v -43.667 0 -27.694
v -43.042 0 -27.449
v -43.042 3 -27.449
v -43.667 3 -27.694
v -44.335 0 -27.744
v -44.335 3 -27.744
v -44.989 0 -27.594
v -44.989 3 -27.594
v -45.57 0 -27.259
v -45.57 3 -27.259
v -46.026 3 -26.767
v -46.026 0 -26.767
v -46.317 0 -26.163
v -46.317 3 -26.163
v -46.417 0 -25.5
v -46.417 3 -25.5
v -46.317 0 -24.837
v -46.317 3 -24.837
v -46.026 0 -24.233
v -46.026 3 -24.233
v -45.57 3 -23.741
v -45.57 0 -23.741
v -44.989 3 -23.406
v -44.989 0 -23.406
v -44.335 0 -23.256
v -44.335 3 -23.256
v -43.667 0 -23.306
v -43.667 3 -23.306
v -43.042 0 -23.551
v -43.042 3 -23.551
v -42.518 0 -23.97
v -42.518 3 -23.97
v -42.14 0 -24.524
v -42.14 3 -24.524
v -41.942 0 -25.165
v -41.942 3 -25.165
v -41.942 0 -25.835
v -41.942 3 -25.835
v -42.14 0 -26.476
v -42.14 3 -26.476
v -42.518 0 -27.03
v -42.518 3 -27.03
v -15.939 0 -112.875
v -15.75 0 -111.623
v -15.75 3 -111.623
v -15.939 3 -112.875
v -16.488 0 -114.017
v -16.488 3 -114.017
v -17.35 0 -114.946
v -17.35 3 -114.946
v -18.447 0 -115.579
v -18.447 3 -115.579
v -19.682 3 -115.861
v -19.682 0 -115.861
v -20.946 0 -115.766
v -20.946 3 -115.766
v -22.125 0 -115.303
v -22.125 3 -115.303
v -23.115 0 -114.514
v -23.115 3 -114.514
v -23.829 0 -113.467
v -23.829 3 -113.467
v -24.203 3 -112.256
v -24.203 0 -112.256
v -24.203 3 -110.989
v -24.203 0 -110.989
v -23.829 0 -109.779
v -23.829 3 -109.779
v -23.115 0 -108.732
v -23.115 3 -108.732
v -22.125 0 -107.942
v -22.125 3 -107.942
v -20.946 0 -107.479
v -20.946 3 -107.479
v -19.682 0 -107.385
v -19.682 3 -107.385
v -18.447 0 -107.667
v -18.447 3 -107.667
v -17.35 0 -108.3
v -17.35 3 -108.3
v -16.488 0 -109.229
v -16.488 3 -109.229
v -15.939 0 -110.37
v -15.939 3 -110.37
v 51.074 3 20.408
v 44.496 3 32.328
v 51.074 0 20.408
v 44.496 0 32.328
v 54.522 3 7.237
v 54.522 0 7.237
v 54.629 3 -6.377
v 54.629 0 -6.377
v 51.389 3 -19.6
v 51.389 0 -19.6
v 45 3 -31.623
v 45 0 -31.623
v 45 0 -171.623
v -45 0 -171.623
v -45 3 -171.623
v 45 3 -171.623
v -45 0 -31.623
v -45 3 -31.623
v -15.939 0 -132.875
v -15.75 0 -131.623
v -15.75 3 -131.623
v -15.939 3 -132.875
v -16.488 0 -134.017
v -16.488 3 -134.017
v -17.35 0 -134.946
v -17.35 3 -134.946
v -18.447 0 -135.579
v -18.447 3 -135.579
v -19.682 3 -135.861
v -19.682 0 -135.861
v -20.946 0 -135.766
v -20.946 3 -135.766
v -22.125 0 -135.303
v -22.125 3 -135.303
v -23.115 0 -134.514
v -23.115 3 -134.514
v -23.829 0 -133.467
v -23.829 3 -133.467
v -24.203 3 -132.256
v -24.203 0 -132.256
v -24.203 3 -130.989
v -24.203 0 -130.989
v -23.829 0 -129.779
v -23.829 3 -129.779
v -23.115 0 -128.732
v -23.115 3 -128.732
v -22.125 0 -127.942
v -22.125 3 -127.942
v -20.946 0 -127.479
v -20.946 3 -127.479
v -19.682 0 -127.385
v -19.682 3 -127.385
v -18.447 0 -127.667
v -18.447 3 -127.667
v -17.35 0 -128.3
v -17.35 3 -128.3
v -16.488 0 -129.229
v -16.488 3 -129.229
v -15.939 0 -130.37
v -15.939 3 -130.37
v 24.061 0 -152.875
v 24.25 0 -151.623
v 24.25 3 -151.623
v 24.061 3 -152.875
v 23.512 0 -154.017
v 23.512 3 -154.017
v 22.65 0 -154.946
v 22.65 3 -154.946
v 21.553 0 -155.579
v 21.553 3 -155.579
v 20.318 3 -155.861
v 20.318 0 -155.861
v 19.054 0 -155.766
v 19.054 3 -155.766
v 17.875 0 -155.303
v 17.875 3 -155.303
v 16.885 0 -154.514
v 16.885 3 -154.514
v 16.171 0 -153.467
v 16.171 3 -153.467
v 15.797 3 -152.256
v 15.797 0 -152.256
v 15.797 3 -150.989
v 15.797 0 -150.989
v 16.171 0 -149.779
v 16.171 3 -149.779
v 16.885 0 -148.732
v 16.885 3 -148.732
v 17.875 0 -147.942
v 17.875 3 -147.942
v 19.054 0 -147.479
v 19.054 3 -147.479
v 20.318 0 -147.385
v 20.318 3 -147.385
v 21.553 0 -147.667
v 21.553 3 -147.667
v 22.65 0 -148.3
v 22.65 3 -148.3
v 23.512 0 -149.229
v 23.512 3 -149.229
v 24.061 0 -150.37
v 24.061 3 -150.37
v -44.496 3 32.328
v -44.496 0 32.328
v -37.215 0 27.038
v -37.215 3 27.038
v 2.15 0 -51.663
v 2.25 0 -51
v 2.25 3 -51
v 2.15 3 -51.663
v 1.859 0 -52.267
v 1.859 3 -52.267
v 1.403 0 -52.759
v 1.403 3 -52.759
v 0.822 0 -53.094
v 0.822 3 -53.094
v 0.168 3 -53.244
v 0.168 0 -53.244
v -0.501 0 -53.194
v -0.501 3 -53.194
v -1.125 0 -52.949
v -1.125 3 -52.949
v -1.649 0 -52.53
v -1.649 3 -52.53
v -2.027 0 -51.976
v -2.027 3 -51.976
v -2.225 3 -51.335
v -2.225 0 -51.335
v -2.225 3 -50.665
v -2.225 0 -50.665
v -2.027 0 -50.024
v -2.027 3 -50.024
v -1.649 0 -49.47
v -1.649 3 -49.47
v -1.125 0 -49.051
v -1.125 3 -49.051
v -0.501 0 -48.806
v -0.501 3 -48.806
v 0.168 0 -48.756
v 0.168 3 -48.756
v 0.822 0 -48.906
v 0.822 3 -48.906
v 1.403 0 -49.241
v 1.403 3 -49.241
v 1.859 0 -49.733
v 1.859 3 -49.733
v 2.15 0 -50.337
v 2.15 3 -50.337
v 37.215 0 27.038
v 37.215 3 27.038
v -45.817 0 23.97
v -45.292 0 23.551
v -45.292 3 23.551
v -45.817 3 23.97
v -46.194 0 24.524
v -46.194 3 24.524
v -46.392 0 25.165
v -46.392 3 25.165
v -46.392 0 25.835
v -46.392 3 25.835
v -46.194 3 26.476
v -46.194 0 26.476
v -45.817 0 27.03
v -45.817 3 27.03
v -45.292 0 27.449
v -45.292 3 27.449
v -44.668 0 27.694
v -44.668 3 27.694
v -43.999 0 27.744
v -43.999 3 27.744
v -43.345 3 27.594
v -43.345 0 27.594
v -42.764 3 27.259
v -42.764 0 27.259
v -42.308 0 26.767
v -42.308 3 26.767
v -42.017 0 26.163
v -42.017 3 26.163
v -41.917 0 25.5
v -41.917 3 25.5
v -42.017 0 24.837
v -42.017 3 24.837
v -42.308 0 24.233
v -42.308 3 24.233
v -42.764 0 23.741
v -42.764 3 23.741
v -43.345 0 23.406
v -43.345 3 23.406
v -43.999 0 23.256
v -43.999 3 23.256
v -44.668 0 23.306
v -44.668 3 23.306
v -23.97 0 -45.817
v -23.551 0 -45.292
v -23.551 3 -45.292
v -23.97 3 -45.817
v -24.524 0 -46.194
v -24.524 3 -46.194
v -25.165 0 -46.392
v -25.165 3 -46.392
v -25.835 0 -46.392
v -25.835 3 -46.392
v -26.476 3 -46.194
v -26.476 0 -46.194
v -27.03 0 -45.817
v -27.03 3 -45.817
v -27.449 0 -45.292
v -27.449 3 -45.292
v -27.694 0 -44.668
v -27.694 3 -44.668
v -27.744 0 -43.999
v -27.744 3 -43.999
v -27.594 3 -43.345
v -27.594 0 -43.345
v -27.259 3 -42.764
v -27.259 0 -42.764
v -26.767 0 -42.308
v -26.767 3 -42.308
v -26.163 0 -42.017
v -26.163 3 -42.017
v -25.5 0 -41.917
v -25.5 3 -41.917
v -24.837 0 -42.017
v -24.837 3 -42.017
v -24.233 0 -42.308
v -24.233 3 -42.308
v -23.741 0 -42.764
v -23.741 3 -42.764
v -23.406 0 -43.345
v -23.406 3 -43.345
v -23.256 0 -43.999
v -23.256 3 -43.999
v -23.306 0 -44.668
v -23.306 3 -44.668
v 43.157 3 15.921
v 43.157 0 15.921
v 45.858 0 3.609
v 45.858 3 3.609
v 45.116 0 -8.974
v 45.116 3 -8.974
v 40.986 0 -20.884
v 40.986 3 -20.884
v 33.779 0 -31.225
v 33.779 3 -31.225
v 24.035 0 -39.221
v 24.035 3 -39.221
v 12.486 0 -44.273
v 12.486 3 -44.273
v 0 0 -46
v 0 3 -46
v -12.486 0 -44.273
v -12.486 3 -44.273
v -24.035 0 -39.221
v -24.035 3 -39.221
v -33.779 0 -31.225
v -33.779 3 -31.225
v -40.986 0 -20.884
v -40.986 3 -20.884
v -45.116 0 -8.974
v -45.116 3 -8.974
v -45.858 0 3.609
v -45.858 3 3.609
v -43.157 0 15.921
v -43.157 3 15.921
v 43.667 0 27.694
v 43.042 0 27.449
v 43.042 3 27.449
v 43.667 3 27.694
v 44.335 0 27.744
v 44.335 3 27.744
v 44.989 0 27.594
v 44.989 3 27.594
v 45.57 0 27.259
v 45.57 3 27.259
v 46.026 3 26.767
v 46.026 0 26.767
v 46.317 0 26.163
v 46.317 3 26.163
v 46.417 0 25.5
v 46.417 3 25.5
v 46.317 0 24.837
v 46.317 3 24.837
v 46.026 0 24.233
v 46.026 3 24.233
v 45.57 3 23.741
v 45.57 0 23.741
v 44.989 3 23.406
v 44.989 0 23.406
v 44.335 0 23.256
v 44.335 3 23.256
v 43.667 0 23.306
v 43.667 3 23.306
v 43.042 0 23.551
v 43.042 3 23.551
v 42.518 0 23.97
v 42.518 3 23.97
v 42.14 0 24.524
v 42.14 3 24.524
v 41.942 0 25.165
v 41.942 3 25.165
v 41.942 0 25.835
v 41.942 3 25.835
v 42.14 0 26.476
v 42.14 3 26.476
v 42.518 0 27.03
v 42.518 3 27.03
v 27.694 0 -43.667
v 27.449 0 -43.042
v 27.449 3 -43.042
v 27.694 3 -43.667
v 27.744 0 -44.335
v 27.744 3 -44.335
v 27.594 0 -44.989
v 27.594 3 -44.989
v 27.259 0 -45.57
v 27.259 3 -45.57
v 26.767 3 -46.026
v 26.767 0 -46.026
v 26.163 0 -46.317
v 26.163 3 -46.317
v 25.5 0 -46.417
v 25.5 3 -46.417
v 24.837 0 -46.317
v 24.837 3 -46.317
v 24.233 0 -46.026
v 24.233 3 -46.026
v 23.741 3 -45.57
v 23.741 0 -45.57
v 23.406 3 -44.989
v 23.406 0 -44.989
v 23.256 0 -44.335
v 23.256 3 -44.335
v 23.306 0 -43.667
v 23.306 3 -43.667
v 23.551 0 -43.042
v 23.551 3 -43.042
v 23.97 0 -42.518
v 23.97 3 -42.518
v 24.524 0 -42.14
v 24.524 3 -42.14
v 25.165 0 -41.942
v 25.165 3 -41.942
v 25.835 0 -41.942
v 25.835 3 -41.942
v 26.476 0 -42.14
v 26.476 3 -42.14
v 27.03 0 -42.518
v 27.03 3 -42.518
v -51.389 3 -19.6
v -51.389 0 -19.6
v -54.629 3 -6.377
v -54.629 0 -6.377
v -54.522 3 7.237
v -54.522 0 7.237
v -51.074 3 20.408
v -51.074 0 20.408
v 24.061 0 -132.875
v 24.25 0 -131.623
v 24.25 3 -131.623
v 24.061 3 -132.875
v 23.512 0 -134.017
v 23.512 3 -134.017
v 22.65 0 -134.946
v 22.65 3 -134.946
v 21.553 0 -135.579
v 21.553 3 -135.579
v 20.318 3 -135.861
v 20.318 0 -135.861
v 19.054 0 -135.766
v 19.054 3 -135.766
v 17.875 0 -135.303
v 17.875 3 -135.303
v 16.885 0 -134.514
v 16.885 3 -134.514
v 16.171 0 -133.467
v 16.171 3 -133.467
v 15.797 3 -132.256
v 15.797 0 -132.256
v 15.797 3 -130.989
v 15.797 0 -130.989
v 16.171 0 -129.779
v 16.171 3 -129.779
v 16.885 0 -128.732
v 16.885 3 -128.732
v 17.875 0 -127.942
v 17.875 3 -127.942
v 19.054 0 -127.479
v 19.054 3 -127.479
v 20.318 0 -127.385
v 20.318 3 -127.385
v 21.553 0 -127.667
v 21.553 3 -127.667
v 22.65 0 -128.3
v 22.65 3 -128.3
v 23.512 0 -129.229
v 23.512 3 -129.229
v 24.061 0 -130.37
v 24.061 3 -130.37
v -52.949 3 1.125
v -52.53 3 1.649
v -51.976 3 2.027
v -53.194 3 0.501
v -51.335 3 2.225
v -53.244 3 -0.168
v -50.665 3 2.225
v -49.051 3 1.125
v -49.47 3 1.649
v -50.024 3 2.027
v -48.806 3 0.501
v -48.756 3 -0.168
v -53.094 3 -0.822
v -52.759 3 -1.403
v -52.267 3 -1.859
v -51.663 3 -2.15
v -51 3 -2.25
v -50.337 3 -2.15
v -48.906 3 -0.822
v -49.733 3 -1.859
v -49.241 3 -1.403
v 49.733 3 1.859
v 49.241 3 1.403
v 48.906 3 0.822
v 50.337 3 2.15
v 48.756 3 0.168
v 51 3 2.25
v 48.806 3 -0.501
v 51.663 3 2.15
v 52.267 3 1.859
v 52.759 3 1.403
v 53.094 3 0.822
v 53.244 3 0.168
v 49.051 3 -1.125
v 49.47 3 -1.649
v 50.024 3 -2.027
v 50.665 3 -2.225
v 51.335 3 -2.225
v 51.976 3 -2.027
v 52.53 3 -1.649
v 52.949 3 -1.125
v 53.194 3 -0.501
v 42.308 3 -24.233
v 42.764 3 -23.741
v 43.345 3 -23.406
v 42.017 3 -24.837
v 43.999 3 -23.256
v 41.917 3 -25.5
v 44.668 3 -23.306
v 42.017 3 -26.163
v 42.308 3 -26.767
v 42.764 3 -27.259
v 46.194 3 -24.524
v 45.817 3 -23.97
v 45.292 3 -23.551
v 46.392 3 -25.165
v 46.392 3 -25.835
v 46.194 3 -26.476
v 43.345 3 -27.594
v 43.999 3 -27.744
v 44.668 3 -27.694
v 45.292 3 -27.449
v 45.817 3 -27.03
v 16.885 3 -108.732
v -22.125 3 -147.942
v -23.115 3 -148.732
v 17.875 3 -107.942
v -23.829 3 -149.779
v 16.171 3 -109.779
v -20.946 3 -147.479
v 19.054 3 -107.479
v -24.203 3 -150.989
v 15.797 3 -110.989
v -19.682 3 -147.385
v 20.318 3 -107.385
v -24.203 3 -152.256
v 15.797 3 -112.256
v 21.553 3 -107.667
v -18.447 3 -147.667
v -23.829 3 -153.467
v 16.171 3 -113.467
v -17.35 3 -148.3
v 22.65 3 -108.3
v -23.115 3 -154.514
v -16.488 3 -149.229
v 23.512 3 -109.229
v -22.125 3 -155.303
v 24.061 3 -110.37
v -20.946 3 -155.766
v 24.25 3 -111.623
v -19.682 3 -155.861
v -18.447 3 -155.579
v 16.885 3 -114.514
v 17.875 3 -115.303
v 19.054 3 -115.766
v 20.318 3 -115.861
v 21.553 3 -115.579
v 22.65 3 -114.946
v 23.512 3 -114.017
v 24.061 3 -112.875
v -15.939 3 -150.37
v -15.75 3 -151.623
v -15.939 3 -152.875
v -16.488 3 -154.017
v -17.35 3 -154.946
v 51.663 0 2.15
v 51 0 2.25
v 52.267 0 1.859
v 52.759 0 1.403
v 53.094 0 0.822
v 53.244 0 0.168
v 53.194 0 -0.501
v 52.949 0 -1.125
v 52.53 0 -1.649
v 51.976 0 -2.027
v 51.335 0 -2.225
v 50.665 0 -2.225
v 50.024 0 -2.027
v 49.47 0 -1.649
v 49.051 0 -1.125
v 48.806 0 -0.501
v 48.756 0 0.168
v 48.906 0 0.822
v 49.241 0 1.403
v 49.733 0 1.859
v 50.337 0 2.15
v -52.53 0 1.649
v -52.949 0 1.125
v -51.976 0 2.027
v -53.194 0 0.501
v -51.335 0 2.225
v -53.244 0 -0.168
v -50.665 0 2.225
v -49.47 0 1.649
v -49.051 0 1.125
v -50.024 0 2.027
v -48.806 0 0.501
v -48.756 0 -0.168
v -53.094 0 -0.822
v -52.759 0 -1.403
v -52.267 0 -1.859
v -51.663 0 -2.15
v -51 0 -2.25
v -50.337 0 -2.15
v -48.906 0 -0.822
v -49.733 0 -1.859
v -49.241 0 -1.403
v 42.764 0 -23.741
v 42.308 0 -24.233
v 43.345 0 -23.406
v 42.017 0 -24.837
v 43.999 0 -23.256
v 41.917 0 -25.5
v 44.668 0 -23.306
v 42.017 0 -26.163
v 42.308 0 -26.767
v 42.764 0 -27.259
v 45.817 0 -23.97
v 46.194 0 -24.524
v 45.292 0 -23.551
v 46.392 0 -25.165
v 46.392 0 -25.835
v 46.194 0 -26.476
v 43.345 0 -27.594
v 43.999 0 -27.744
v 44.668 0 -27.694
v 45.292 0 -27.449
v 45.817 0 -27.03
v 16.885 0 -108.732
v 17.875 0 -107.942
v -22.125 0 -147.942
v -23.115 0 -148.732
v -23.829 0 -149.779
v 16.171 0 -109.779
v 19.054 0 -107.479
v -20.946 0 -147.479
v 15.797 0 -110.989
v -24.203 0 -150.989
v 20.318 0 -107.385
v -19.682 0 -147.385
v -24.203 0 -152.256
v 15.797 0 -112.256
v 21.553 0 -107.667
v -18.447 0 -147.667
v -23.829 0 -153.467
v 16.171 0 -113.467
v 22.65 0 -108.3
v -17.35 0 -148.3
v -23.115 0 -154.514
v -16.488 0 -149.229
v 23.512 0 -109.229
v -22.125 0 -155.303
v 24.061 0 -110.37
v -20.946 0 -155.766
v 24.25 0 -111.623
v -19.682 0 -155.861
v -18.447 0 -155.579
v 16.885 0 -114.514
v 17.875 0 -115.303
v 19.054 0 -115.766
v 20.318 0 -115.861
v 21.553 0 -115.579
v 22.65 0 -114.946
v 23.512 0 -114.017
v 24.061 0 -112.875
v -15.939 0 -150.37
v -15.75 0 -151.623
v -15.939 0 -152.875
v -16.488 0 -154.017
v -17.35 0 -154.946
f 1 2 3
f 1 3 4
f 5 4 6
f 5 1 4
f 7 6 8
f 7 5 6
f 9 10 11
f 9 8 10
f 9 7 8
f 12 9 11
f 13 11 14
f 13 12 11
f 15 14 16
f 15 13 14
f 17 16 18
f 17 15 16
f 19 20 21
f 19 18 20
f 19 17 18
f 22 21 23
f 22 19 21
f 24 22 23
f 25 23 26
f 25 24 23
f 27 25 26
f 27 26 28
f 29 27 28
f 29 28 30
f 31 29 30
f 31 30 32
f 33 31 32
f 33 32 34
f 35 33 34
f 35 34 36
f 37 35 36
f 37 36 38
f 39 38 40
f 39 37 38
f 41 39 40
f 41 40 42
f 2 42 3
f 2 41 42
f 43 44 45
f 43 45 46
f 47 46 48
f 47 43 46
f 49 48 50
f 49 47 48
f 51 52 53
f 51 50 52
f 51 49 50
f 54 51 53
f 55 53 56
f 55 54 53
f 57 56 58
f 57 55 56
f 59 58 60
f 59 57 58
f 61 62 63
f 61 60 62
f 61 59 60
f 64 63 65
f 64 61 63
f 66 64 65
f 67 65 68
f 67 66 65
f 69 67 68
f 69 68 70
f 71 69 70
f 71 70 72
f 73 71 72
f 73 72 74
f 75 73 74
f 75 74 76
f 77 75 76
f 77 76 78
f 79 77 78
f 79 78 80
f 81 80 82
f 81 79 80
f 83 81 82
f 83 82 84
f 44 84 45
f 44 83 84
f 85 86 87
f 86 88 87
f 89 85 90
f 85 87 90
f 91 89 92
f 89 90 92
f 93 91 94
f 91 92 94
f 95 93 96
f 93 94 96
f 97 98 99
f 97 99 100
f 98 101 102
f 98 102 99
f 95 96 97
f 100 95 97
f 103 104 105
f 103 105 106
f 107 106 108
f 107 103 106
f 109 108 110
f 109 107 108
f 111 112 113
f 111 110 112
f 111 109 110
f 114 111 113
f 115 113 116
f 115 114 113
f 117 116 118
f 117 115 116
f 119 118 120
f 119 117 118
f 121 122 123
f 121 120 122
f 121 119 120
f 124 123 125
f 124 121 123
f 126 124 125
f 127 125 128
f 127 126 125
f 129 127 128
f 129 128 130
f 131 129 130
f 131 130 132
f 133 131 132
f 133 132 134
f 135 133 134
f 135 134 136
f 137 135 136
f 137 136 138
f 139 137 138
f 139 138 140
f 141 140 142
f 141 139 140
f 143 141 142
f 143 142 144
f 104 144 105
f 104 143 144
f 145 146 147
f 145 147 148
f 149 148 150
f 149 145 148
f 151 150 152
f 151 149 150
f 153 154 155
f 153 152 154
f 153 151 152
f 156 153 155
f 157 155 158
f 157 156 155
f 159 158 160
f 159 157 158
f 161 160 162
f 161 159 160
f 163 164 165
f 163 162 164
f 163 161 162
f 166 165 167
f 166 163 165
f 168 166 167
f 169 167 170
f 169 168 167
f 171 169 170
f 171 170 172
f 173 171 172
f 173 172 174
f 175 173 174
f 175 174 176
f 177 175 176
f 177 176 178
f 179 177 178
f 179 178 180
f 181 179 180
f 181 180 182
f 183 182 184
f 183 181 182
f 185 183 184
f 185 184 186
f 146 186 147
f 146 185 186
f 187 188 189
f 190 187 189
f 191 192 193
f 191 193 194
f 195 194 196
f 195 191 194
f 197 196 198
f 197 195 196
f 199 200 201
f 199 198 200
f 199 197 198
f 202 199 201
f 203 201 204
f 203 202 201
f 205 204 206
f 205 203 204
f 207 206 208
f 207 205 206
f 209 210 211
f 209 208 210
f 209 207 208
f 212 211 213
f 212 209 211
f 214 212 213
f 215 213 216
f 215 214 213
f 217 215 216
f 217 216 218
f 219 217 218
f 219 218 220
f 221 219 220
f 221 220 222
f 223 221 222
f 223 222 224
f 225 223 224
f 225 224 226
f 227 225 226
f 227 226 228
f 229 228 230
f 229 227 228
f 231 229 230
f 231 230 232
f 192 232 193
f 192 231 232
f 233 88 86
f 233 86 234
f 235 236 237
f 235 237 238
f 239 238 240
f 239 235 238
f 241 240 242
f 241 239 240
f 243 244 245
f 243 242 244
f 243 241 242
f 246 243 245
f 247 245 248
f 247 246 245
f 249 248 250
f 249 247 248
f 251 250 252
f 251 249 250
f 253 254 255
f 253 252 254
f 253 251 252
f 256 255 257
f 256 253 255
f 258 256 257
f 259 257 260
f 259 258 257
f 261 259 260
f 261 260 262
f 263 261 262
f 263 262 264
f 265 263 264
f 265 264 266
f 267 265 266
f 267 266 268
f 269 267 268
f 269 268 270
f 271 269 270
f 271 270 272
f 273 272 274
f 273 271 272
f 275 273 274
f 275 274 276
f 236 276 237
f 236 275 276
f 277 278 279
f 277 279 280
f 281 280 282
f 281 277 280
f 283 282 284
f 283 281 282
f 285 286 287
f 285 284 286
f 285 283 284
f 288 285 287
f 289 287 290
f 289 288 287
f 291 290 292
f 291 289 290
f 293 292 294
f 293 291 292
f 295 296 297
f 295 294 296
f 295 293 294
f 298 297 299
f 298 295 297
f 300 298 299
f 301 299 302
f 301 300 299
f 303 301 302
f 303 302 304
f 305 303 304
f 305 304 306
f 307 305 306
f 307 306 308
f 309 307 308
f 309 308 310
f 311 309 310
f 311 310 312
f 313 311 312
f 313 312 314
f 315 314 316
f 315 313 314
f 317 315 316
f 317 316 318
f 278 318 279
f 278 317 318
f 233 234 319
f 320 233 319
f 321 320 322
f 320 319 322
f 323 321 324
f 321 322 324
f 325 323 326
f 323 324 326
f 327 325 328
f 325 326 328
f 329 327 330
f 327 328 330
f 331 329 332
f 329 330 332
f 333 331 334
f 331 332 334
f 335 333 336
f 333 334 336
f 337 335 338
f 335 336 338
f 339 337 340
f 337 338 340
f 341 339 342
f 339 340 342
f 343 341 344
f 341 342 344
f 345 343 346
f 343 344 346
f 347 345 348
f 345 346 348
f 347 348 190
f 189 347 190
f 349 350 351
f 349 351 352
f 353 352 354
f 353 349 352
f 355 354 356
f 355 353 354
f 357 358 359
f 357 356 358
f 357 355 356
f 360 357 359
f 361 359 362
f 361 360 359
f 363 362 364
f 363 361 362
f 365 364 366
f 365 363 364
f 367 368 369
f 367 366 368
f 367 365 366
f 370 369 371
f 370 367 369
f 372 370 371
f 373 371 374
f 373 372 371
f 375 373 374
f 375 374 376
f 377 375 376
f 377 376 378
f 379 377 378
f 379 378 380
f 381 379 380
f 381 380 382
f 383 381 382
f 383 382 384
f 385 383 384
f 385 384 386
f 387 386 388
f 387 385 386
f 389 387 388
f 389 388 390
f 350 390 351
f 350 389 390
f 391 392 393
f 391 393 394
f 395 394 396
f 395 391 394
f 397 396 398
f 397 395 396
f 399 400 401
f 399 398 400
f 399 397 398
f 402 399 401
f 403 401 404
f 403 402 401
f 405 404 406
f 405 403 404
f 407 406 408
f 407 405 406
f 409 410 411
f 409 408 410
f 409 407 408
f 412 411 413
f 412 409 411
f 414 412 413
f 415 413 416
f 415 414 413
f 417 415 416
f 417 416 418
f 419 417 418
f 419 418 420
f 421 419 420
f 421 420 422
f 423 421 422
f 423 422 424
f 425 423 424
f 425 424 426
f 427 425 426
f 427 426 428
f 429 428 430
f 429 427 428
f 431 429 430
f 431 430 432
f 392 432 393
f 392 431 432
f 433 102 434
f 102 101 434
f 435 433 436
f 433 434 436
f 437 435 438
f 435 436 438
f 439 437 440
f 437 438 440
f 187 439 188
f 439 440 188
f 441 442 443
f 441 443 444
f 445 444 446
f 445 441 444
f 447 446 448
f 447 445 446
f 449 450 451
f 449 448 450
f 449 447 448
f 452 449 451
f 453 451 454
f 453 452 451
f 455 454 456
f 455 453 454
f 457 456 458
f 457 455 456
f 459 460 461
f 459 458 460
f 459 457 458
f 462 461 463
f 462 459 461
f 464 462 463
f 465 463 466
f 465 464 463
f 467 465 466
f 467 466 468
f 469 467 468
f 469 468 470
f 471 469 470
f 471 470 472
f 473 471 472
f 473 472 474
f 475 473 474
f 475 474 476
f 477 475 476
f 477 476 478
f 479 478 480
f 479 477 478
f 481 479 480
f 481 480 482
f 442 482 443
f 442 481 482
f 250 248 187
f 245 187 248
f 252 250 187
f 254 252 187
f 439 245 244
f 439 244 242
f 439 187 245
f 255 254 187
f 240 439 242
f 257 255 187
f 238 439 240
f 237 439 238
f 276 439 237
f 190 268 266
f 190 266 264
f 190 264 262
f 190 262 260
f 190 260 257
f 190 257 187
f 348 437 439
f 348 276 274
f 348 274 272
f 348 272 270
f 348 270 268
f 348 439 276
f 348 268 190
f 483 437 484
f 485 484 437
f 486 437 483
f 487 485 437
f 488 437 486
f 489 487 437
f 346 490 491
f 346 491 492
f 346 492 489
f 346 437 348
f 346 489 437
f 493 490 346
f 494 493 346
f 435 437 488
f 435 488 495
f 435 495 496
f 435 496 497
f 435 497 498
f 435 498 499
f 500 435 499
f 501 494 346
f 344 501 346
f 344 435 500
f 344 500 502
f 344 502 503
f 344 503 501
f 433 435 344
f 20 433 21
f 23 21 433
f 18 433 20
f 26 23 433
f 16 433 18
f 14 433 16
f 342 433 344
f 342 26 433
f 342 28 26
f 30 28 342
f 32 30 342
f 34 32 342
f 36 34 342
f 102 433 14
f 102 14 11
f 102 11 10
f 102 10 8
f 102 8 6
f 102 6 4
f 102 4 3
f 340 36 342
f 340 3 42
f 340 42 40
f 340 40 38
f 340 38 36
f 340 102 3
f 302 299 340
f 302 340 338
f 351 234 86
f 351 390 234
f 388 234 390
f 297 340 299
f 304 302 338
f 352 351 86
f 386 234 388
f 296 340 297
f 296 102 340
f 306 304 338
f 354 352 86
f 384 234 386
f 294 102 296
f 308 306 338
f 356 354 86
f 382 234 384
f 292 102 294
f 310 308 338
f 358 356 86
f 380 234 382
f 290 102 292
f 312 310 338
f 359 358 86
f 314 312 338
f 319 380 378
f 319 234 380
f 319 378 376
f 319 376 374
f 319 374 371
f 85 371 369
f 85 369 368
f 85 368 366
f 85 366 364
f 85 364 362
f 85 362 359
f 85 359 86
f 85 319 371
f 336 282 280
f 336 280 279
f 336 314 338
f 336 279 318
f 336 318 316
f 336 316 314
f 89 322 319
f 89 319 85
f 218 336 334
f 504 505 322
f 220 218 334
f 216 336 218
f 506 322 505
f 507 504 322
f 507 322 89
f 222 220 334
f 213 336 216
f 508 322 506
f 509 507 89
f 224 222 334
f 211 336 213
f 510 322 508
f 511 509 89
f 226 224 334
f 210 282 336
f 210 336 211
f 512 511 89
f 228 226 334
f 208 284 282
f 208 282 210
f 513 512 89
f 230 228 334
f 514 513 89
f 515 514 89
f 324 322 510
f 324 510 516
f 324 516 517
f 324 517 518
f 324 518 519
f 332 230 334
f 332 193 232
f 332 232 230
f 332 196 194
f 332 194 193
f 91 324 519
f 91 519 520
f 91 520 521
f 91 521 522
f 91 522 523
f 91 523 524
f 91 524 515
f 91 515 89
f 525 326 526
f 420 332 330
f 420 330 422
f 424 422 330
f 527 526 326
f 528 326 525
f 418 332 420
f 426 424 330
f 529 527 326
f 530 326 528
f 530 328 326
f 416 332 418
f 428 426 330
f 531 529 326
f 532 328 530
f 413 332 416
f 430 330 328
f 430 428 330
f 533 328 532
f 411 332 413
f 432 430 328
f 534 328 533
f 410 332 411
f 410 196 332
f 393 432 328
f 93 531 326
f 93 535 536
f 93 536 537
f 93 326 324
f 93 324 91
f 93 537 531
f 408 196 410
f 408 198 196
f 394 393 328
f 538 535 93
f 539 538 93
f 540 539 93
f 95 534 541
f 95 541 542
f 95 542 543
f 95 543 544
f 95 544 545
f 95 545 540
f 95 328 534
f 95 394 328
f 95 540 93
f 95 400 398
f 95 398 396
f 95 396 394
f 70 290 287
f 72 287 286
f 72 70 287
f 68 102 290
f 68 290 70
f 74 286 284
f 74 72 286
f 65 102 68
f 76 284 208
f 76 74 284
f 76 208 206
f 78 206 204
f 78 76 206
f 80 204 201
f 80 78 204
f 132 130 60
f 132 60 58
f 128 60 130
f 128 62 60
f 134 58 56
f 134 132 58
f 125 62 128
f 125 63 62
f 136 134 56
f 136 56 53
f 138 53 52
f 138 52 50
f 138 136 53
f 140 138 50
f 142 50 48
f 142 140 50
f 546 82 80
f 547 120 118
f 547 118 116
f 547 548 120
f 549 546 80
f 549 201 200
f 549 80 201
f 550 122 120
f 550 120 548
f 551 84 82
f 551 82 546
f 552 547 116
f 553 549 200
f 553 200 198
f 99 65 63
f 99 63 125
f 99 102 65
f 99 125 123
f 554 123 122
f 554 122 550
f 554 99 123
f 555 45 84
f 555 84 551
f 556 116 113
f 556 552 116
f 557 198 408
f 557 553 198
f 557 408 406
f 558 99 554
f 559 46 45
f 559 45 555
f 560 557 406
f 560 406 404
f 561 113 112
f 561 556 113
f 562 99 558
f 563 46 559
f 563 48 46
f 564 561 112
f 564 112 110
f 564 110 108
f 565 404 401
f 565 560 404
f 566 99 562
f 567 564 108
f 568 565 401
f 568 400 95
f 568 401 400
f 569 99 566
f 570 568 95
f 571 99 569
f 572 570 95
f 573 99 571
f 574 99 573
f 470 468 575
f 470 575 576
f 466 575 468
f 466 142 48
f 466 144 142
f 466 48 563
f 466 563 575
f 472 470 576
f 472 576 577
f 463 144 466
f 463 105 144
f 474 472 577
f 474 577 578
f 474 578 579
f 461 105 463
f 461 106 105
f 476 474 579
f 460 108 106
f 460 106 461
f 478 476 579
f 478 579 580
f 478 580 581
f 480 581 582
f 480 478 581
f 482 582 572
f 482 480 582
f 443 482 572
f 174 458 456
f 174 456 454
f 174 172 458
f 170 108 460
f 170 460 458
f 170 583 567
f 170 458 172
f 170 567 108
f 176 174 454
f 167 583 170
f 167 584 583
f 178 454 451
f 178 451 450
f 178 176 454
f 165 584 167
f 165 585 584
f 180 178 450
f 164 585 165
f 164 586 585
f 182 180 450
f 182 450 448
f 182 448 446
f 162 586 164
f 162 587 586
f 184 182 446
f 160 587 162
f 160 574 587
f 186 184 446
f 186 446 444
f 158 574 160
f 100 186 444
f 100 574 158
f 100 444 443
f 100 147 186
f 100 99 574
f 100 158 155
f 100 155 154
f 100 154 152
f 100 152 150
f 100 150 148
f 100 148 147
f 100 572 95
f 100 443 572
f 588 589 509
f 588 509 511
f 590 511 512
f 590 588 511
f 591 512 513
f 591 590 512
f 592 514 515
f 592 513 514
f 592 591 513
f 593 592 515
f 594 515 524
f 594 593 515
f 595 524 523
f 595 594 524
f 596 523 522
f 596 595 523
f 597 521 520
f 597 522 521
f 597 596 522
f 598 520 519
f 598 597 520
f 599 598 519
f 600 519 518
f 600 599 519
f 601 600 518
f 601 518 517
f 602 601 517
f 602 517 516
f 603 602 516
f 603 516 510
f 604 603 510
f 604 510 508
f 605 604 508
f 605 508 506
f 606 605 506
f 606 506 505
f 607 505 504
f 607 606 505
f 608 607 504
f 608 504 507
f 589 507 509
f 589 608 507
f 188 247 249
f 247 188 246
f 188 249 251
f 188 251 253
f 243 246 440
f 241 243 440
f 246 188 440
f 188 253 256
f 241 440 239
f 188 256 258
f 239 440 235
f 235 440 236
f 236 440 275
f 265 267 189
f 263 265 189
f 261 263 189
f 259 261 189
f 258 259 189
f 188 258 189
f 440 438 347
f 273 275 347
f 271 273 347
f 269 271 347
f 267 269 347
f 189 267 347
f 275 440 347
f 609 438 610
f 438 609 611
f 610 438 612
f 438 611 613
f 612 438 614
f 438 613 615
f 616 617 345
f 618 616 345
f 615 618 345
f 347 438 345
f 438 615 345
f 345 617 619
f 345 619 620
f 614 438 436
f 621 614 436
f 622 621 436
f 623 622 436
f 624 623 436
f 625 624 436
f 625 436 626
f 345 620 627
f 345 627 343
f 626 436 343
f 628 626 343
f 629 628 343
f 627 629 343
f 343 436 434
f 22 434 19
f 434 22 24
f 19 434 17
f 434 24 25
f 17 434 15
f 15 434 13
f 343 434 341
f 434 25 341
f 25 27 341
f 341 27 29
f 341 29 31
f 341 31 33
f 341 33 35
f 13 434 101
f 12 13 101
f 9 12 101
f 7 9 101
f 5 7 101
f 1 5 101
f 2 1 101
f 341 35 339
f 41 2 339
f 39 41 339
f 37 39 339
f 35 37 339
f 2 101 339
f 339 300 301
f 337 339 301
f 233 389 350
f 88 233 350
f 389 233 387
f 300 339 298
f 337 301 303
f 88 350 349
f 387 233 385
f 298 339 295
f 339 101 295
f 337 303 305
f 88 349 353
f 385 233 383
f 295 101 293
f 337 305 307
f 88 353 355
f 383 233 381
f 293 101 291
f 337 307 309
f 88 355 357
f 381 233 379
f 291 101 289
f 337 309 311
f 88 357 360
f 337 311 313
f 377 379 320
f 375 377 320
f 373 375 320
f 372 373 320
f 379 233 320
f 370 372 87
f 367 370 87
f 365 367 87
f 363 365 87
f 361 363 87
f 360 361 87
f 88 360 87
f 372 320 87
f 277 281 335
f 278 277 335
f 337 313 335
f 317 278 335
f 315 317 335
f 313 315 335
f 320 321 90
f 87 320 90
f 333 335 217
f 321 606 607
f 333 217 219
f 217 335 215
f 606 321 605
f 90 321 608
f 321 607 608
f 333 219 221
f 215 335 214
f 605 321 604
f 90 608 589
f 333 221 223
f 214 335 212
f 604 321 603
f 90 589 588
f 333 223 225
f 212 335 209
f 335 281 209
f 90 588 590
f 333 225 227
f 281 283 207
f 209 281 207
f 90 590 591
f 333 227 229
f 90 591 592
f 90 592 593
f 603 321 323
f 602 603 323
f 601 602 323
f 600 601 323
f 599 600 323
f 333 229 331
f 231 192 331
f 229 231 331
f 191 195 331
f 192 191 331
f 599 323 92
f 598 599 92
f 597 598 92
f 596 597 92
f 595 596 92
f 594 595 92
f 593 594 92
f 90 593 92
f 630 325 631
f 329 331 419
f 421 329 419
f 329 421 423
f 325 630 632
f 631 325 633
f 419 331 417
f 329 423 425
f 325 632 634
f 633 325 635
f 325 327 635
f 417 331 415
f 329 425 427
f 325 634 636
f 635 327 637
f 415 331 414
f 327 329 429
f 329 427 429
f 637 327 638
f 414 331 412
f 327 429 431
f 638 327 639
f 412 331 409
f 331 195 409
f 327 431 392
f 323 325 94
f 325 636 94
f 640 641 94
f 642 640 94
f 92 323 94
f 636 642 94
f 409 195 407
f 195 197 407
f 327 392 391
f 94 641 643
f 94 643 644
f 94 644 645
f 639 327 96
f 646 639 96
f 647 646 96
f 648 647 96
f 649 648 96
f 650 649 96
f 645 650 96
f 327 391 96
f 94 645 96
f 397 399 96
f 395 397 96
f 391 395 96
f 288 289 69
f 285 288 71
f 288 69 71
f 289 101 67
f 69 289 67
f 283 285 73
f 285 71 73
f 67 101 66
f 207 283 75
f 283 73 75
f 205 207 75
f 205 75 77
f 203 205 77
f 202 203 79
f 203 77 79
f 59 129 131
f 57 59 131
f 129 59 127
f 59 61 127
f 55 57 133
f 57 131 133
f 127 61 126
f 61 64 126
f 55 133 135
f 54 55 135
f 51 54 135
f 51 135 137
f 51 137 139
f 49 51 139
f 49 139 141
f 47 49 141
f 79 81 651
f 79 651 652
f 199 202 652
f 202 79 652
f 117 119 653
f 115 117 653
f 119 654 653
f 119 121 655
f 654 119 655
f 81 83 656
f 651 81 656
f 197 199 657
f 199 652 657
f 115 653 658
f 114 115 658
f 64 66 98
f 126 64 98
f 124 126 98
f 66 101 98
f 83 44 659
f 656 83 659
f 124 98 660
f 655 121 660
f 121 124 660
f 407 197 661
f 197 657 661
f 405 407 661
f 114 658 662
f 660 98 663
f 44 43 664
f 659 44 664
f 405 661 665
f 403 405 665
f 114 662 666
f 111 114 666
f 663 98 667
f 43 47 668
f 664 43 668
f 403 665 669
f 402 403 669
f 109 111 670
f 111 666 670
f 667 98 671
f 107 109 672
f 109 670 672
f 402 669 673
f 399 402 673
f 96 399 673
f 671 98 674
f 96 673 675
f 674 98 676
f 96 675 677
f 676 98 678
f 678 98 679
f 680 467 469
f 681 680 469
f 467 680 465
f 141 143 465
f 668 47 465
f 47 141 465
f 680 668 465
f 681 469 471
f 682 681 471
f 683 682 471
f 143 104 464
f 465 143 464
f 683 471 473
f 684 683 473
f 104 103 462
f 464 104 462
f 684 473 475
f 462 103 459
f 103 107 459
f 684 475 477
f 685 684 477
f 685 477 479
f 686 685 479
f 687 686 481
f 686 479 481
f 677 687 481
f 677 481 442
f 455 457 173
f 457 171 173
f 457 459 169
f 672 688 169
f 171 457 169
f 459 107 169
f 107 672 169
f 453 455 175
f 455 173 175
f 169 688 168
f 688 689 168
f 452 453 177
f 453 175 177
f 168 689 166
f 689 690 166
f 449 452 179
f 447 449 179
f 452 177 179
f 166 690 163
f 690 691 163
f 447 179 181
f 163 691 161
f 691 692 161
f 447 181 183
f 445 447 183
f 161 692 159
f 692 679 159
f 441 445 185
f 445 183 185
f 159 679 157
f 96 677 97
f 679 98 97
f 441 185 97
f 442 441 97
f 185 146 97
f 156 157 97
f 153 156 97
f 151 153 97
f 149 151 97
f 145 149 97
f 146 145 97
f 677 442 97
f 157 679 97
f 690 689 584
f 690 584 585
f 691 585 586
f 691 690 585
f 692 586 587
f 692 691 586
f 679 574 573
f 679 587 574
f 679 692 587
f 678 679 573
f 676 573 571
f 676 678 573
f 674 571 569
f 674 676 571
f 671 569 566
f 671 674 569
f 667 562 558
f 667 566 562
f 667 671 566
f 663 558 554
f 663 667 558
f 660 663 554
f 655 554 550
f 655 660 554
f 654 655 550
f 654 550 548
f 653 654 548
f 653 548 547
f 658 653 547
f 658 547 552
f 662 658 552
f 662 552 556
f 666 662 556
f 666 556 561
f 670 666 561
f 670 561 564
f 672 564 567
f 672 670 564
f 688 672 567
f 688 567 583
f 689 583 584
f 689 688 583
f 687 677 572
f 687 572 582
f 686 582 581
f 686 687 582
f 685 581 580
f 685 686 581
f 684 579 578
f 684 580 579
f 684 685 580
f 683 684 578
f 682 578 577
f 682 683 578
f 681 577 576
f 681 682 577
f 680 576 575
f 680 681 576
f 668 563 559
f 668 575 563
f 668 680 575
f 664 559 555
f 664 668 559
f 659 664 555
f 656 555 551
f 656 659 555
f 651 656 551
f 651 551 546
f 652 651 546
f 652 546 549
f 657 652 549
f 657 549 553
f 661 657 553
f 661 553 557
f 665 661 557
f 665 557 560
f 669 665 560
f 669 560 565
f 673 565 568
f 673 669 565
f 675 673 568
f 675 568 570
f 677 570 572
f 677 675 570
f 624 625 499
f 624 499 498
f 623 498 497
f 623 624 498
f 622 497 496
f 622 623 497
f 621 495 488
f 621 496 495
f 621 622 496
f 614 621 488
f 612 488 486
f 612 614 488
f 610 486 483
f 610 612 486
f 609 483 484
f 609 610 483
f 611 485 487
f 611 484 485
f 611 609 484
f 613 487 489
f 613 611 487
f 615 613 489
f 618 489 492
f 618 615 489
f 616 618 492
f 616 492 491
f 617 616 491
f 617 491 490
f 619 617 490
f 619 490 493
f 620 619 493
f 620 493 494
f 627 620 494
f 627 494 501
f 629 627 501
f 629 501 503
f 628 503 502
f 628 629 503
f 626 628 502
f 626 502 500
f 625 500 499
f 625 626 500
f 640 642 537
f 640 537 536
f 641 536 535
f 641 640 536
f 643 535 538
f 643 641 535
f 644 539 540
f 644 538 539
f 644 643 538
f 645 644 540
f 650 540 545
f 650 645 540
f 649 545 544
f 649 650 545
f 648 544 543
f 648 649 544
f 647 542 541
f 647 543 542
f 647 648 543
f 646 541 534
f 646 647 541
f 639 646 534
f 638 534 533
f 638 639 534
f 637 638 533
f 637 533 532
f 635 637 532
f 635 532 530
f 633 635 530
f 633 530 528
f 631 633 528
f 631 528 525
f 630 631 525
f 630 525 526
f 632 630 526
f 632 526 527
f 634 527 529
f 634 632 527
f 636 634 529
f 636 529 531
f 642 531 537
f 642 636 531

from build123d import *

# Parameters (mm, degrees)
SKETCH1_R               = 55
BOSS_EXTRUDE1_DEPTH     = 3
SKETCH2_W               = 90
SKETCH2_H               = 140
BOSS_EXTRUDE2_DEPTH     = 3
SKETCH4_R               = 46
CUT_EXTRUDE2_DEPTH      = 1
CUT_EXTRUDE2_DEPTH_BACK = 4
CUT_EXTRUDE5_START      = -4
CUT_EXTRUDE5_DEPTH      = 5
CUT_EXTRUDE3_START      = -4
SKETCH5_R               = 2.25
CUT_EXTRUDE3_DEPTH      = 5
CIRPATTERN1_COUNT       = 12
CUT_EXTRUDE4_START      = -4
SKETCH6_R               = 4.25
CUT_EXTRUDE4_DEPTH      = 5
LPATTERN1_COUNT         = 3
LPATTERN1_PITCH         = 20


with BuildPart() as part:
    # Sketch1 → Boss-Extrude1 (new body)
    with BuildSketch(Plane(origin=(0, 0, 0), x_dir=(1, 0, 0), z_dir=(0, 1, 0))):
        Circle(SKETCH1_R)
    extrude(amount=BOSS_EXTRUDE1_DEPTH)

    # Sketch2 → Boss-Extrude2 (add)
    with BuildSketch(Plane(origin=(0, 0, 0), x_dir=(1, 0, 0), z_dir=(0, 1, 0))):
        with Locations((0, 101.622776602)):
            Rectangle(SKETCH2_W, SKETCH2_H)
    extrude(amount=BOSS_EXTRUDE2_DEPTH)

    # Sketch4 → Cut-Extrude2 (cut, two sides)
    with BuildSketch(Plane(origin=(0, 3, 0), x_dir=(1, 0, 0), z_dir=(0, 1, 0))) as cut_extrude2_sk:
        Circle(SKETCH4_R)
    extrude(amount=CUT_EXTRUDE2_DEPTH, mode=Mode.SUBTRACT)
    extrude(cut_extrude2_sk.sketch, amount=-CUT_EXTRUDE2_DEPTH_BACK, mode=Mode.SUBTRACT)

    # Sketch7 → Cut-Extrude5 (cut)
    with BuildSketch(Plane(origin=(0, 3, 0), x_dir=(1, 0, 0), z_dir=(0, 1, 0)).offset(CUT_EXTRUDE5_START)):
        with BuildLine():
            Line((0, 0), (0, -55))
            ThreePointArc((0, -55), (-24.969477486, -49.00535883), (-44.495934691, -32.328188876))
            Line((-44.495934691, -32.328188876), (0, 0))
        make_face()
    cut_extrude5 = extrude(amount=CUT_EXTRUDE5_DEPTH, mode=Mode.SUBTRACT)

    # Mirror1: Cut-Extrude5 across plane
    add(cut_extrude5.mirror(Plane(origin=(0, 0, 0), x_dir=(0, 0, 1), z_dir=(1, 0, 0))), mode=Mode.SUBTRACT)

    # Sketch5 → Cut-Extrude3 (cut)
    with BuildSketch(Plane(origin=(0, 3, 0), x_dir=(1, 0, 0), z_dir=(0, 1, 0)).offset(CUT_EXTRUDE3_START)):
        with Locations((0, 51)):
            Circle(SKETCH5_R)
    cut_extrude3 = extrude(amount=CUT_EXTRUDE3_DEPTH, mode=Mode.SUBTRACT)

    # CirPattern1: Cut-Extrude3 ×12 about axis
    cirpattern1_axis = Axis((0, 0, 0), (0, 1, 0))
    for i in range(1, CIRPATTERN1_COUNT):
        add(cut_extrude3.rotate(cirpattern1_axis, i * 360 / CIRPATTERN1_COUNT), mode=Mode.SUBTRACT)

    # Sketch6 → Cut-Extrude4 (cut)
    with BuildSketch(Plane(origin=(0, 3, 0), x_dir=(1, 0, 0), z_dir=(0, 1, 0)).offset(CUT_EXTRUDE4_START)):
        with Locations((20, 151.622776602)):
            Circle(SKETCH6_R)
        with Locations((-20, 151.622776602)):
            Circle(SKETCH6_R)
    cut_extrude4 = extrude(amount=CUT_EXTRUDE4_DEPTH, mode=Mode.SUBTRACT)

    # LPattern1: Cut-Extrude4 ×3
    with Locations(*[(0, 0, i * LPATTERN1_PITCH) for i in range(1, LPATTERN1_COUNT)]):
        add(cut_extrude4, mode=Mode.SUBTRACT)


solid = part.part
